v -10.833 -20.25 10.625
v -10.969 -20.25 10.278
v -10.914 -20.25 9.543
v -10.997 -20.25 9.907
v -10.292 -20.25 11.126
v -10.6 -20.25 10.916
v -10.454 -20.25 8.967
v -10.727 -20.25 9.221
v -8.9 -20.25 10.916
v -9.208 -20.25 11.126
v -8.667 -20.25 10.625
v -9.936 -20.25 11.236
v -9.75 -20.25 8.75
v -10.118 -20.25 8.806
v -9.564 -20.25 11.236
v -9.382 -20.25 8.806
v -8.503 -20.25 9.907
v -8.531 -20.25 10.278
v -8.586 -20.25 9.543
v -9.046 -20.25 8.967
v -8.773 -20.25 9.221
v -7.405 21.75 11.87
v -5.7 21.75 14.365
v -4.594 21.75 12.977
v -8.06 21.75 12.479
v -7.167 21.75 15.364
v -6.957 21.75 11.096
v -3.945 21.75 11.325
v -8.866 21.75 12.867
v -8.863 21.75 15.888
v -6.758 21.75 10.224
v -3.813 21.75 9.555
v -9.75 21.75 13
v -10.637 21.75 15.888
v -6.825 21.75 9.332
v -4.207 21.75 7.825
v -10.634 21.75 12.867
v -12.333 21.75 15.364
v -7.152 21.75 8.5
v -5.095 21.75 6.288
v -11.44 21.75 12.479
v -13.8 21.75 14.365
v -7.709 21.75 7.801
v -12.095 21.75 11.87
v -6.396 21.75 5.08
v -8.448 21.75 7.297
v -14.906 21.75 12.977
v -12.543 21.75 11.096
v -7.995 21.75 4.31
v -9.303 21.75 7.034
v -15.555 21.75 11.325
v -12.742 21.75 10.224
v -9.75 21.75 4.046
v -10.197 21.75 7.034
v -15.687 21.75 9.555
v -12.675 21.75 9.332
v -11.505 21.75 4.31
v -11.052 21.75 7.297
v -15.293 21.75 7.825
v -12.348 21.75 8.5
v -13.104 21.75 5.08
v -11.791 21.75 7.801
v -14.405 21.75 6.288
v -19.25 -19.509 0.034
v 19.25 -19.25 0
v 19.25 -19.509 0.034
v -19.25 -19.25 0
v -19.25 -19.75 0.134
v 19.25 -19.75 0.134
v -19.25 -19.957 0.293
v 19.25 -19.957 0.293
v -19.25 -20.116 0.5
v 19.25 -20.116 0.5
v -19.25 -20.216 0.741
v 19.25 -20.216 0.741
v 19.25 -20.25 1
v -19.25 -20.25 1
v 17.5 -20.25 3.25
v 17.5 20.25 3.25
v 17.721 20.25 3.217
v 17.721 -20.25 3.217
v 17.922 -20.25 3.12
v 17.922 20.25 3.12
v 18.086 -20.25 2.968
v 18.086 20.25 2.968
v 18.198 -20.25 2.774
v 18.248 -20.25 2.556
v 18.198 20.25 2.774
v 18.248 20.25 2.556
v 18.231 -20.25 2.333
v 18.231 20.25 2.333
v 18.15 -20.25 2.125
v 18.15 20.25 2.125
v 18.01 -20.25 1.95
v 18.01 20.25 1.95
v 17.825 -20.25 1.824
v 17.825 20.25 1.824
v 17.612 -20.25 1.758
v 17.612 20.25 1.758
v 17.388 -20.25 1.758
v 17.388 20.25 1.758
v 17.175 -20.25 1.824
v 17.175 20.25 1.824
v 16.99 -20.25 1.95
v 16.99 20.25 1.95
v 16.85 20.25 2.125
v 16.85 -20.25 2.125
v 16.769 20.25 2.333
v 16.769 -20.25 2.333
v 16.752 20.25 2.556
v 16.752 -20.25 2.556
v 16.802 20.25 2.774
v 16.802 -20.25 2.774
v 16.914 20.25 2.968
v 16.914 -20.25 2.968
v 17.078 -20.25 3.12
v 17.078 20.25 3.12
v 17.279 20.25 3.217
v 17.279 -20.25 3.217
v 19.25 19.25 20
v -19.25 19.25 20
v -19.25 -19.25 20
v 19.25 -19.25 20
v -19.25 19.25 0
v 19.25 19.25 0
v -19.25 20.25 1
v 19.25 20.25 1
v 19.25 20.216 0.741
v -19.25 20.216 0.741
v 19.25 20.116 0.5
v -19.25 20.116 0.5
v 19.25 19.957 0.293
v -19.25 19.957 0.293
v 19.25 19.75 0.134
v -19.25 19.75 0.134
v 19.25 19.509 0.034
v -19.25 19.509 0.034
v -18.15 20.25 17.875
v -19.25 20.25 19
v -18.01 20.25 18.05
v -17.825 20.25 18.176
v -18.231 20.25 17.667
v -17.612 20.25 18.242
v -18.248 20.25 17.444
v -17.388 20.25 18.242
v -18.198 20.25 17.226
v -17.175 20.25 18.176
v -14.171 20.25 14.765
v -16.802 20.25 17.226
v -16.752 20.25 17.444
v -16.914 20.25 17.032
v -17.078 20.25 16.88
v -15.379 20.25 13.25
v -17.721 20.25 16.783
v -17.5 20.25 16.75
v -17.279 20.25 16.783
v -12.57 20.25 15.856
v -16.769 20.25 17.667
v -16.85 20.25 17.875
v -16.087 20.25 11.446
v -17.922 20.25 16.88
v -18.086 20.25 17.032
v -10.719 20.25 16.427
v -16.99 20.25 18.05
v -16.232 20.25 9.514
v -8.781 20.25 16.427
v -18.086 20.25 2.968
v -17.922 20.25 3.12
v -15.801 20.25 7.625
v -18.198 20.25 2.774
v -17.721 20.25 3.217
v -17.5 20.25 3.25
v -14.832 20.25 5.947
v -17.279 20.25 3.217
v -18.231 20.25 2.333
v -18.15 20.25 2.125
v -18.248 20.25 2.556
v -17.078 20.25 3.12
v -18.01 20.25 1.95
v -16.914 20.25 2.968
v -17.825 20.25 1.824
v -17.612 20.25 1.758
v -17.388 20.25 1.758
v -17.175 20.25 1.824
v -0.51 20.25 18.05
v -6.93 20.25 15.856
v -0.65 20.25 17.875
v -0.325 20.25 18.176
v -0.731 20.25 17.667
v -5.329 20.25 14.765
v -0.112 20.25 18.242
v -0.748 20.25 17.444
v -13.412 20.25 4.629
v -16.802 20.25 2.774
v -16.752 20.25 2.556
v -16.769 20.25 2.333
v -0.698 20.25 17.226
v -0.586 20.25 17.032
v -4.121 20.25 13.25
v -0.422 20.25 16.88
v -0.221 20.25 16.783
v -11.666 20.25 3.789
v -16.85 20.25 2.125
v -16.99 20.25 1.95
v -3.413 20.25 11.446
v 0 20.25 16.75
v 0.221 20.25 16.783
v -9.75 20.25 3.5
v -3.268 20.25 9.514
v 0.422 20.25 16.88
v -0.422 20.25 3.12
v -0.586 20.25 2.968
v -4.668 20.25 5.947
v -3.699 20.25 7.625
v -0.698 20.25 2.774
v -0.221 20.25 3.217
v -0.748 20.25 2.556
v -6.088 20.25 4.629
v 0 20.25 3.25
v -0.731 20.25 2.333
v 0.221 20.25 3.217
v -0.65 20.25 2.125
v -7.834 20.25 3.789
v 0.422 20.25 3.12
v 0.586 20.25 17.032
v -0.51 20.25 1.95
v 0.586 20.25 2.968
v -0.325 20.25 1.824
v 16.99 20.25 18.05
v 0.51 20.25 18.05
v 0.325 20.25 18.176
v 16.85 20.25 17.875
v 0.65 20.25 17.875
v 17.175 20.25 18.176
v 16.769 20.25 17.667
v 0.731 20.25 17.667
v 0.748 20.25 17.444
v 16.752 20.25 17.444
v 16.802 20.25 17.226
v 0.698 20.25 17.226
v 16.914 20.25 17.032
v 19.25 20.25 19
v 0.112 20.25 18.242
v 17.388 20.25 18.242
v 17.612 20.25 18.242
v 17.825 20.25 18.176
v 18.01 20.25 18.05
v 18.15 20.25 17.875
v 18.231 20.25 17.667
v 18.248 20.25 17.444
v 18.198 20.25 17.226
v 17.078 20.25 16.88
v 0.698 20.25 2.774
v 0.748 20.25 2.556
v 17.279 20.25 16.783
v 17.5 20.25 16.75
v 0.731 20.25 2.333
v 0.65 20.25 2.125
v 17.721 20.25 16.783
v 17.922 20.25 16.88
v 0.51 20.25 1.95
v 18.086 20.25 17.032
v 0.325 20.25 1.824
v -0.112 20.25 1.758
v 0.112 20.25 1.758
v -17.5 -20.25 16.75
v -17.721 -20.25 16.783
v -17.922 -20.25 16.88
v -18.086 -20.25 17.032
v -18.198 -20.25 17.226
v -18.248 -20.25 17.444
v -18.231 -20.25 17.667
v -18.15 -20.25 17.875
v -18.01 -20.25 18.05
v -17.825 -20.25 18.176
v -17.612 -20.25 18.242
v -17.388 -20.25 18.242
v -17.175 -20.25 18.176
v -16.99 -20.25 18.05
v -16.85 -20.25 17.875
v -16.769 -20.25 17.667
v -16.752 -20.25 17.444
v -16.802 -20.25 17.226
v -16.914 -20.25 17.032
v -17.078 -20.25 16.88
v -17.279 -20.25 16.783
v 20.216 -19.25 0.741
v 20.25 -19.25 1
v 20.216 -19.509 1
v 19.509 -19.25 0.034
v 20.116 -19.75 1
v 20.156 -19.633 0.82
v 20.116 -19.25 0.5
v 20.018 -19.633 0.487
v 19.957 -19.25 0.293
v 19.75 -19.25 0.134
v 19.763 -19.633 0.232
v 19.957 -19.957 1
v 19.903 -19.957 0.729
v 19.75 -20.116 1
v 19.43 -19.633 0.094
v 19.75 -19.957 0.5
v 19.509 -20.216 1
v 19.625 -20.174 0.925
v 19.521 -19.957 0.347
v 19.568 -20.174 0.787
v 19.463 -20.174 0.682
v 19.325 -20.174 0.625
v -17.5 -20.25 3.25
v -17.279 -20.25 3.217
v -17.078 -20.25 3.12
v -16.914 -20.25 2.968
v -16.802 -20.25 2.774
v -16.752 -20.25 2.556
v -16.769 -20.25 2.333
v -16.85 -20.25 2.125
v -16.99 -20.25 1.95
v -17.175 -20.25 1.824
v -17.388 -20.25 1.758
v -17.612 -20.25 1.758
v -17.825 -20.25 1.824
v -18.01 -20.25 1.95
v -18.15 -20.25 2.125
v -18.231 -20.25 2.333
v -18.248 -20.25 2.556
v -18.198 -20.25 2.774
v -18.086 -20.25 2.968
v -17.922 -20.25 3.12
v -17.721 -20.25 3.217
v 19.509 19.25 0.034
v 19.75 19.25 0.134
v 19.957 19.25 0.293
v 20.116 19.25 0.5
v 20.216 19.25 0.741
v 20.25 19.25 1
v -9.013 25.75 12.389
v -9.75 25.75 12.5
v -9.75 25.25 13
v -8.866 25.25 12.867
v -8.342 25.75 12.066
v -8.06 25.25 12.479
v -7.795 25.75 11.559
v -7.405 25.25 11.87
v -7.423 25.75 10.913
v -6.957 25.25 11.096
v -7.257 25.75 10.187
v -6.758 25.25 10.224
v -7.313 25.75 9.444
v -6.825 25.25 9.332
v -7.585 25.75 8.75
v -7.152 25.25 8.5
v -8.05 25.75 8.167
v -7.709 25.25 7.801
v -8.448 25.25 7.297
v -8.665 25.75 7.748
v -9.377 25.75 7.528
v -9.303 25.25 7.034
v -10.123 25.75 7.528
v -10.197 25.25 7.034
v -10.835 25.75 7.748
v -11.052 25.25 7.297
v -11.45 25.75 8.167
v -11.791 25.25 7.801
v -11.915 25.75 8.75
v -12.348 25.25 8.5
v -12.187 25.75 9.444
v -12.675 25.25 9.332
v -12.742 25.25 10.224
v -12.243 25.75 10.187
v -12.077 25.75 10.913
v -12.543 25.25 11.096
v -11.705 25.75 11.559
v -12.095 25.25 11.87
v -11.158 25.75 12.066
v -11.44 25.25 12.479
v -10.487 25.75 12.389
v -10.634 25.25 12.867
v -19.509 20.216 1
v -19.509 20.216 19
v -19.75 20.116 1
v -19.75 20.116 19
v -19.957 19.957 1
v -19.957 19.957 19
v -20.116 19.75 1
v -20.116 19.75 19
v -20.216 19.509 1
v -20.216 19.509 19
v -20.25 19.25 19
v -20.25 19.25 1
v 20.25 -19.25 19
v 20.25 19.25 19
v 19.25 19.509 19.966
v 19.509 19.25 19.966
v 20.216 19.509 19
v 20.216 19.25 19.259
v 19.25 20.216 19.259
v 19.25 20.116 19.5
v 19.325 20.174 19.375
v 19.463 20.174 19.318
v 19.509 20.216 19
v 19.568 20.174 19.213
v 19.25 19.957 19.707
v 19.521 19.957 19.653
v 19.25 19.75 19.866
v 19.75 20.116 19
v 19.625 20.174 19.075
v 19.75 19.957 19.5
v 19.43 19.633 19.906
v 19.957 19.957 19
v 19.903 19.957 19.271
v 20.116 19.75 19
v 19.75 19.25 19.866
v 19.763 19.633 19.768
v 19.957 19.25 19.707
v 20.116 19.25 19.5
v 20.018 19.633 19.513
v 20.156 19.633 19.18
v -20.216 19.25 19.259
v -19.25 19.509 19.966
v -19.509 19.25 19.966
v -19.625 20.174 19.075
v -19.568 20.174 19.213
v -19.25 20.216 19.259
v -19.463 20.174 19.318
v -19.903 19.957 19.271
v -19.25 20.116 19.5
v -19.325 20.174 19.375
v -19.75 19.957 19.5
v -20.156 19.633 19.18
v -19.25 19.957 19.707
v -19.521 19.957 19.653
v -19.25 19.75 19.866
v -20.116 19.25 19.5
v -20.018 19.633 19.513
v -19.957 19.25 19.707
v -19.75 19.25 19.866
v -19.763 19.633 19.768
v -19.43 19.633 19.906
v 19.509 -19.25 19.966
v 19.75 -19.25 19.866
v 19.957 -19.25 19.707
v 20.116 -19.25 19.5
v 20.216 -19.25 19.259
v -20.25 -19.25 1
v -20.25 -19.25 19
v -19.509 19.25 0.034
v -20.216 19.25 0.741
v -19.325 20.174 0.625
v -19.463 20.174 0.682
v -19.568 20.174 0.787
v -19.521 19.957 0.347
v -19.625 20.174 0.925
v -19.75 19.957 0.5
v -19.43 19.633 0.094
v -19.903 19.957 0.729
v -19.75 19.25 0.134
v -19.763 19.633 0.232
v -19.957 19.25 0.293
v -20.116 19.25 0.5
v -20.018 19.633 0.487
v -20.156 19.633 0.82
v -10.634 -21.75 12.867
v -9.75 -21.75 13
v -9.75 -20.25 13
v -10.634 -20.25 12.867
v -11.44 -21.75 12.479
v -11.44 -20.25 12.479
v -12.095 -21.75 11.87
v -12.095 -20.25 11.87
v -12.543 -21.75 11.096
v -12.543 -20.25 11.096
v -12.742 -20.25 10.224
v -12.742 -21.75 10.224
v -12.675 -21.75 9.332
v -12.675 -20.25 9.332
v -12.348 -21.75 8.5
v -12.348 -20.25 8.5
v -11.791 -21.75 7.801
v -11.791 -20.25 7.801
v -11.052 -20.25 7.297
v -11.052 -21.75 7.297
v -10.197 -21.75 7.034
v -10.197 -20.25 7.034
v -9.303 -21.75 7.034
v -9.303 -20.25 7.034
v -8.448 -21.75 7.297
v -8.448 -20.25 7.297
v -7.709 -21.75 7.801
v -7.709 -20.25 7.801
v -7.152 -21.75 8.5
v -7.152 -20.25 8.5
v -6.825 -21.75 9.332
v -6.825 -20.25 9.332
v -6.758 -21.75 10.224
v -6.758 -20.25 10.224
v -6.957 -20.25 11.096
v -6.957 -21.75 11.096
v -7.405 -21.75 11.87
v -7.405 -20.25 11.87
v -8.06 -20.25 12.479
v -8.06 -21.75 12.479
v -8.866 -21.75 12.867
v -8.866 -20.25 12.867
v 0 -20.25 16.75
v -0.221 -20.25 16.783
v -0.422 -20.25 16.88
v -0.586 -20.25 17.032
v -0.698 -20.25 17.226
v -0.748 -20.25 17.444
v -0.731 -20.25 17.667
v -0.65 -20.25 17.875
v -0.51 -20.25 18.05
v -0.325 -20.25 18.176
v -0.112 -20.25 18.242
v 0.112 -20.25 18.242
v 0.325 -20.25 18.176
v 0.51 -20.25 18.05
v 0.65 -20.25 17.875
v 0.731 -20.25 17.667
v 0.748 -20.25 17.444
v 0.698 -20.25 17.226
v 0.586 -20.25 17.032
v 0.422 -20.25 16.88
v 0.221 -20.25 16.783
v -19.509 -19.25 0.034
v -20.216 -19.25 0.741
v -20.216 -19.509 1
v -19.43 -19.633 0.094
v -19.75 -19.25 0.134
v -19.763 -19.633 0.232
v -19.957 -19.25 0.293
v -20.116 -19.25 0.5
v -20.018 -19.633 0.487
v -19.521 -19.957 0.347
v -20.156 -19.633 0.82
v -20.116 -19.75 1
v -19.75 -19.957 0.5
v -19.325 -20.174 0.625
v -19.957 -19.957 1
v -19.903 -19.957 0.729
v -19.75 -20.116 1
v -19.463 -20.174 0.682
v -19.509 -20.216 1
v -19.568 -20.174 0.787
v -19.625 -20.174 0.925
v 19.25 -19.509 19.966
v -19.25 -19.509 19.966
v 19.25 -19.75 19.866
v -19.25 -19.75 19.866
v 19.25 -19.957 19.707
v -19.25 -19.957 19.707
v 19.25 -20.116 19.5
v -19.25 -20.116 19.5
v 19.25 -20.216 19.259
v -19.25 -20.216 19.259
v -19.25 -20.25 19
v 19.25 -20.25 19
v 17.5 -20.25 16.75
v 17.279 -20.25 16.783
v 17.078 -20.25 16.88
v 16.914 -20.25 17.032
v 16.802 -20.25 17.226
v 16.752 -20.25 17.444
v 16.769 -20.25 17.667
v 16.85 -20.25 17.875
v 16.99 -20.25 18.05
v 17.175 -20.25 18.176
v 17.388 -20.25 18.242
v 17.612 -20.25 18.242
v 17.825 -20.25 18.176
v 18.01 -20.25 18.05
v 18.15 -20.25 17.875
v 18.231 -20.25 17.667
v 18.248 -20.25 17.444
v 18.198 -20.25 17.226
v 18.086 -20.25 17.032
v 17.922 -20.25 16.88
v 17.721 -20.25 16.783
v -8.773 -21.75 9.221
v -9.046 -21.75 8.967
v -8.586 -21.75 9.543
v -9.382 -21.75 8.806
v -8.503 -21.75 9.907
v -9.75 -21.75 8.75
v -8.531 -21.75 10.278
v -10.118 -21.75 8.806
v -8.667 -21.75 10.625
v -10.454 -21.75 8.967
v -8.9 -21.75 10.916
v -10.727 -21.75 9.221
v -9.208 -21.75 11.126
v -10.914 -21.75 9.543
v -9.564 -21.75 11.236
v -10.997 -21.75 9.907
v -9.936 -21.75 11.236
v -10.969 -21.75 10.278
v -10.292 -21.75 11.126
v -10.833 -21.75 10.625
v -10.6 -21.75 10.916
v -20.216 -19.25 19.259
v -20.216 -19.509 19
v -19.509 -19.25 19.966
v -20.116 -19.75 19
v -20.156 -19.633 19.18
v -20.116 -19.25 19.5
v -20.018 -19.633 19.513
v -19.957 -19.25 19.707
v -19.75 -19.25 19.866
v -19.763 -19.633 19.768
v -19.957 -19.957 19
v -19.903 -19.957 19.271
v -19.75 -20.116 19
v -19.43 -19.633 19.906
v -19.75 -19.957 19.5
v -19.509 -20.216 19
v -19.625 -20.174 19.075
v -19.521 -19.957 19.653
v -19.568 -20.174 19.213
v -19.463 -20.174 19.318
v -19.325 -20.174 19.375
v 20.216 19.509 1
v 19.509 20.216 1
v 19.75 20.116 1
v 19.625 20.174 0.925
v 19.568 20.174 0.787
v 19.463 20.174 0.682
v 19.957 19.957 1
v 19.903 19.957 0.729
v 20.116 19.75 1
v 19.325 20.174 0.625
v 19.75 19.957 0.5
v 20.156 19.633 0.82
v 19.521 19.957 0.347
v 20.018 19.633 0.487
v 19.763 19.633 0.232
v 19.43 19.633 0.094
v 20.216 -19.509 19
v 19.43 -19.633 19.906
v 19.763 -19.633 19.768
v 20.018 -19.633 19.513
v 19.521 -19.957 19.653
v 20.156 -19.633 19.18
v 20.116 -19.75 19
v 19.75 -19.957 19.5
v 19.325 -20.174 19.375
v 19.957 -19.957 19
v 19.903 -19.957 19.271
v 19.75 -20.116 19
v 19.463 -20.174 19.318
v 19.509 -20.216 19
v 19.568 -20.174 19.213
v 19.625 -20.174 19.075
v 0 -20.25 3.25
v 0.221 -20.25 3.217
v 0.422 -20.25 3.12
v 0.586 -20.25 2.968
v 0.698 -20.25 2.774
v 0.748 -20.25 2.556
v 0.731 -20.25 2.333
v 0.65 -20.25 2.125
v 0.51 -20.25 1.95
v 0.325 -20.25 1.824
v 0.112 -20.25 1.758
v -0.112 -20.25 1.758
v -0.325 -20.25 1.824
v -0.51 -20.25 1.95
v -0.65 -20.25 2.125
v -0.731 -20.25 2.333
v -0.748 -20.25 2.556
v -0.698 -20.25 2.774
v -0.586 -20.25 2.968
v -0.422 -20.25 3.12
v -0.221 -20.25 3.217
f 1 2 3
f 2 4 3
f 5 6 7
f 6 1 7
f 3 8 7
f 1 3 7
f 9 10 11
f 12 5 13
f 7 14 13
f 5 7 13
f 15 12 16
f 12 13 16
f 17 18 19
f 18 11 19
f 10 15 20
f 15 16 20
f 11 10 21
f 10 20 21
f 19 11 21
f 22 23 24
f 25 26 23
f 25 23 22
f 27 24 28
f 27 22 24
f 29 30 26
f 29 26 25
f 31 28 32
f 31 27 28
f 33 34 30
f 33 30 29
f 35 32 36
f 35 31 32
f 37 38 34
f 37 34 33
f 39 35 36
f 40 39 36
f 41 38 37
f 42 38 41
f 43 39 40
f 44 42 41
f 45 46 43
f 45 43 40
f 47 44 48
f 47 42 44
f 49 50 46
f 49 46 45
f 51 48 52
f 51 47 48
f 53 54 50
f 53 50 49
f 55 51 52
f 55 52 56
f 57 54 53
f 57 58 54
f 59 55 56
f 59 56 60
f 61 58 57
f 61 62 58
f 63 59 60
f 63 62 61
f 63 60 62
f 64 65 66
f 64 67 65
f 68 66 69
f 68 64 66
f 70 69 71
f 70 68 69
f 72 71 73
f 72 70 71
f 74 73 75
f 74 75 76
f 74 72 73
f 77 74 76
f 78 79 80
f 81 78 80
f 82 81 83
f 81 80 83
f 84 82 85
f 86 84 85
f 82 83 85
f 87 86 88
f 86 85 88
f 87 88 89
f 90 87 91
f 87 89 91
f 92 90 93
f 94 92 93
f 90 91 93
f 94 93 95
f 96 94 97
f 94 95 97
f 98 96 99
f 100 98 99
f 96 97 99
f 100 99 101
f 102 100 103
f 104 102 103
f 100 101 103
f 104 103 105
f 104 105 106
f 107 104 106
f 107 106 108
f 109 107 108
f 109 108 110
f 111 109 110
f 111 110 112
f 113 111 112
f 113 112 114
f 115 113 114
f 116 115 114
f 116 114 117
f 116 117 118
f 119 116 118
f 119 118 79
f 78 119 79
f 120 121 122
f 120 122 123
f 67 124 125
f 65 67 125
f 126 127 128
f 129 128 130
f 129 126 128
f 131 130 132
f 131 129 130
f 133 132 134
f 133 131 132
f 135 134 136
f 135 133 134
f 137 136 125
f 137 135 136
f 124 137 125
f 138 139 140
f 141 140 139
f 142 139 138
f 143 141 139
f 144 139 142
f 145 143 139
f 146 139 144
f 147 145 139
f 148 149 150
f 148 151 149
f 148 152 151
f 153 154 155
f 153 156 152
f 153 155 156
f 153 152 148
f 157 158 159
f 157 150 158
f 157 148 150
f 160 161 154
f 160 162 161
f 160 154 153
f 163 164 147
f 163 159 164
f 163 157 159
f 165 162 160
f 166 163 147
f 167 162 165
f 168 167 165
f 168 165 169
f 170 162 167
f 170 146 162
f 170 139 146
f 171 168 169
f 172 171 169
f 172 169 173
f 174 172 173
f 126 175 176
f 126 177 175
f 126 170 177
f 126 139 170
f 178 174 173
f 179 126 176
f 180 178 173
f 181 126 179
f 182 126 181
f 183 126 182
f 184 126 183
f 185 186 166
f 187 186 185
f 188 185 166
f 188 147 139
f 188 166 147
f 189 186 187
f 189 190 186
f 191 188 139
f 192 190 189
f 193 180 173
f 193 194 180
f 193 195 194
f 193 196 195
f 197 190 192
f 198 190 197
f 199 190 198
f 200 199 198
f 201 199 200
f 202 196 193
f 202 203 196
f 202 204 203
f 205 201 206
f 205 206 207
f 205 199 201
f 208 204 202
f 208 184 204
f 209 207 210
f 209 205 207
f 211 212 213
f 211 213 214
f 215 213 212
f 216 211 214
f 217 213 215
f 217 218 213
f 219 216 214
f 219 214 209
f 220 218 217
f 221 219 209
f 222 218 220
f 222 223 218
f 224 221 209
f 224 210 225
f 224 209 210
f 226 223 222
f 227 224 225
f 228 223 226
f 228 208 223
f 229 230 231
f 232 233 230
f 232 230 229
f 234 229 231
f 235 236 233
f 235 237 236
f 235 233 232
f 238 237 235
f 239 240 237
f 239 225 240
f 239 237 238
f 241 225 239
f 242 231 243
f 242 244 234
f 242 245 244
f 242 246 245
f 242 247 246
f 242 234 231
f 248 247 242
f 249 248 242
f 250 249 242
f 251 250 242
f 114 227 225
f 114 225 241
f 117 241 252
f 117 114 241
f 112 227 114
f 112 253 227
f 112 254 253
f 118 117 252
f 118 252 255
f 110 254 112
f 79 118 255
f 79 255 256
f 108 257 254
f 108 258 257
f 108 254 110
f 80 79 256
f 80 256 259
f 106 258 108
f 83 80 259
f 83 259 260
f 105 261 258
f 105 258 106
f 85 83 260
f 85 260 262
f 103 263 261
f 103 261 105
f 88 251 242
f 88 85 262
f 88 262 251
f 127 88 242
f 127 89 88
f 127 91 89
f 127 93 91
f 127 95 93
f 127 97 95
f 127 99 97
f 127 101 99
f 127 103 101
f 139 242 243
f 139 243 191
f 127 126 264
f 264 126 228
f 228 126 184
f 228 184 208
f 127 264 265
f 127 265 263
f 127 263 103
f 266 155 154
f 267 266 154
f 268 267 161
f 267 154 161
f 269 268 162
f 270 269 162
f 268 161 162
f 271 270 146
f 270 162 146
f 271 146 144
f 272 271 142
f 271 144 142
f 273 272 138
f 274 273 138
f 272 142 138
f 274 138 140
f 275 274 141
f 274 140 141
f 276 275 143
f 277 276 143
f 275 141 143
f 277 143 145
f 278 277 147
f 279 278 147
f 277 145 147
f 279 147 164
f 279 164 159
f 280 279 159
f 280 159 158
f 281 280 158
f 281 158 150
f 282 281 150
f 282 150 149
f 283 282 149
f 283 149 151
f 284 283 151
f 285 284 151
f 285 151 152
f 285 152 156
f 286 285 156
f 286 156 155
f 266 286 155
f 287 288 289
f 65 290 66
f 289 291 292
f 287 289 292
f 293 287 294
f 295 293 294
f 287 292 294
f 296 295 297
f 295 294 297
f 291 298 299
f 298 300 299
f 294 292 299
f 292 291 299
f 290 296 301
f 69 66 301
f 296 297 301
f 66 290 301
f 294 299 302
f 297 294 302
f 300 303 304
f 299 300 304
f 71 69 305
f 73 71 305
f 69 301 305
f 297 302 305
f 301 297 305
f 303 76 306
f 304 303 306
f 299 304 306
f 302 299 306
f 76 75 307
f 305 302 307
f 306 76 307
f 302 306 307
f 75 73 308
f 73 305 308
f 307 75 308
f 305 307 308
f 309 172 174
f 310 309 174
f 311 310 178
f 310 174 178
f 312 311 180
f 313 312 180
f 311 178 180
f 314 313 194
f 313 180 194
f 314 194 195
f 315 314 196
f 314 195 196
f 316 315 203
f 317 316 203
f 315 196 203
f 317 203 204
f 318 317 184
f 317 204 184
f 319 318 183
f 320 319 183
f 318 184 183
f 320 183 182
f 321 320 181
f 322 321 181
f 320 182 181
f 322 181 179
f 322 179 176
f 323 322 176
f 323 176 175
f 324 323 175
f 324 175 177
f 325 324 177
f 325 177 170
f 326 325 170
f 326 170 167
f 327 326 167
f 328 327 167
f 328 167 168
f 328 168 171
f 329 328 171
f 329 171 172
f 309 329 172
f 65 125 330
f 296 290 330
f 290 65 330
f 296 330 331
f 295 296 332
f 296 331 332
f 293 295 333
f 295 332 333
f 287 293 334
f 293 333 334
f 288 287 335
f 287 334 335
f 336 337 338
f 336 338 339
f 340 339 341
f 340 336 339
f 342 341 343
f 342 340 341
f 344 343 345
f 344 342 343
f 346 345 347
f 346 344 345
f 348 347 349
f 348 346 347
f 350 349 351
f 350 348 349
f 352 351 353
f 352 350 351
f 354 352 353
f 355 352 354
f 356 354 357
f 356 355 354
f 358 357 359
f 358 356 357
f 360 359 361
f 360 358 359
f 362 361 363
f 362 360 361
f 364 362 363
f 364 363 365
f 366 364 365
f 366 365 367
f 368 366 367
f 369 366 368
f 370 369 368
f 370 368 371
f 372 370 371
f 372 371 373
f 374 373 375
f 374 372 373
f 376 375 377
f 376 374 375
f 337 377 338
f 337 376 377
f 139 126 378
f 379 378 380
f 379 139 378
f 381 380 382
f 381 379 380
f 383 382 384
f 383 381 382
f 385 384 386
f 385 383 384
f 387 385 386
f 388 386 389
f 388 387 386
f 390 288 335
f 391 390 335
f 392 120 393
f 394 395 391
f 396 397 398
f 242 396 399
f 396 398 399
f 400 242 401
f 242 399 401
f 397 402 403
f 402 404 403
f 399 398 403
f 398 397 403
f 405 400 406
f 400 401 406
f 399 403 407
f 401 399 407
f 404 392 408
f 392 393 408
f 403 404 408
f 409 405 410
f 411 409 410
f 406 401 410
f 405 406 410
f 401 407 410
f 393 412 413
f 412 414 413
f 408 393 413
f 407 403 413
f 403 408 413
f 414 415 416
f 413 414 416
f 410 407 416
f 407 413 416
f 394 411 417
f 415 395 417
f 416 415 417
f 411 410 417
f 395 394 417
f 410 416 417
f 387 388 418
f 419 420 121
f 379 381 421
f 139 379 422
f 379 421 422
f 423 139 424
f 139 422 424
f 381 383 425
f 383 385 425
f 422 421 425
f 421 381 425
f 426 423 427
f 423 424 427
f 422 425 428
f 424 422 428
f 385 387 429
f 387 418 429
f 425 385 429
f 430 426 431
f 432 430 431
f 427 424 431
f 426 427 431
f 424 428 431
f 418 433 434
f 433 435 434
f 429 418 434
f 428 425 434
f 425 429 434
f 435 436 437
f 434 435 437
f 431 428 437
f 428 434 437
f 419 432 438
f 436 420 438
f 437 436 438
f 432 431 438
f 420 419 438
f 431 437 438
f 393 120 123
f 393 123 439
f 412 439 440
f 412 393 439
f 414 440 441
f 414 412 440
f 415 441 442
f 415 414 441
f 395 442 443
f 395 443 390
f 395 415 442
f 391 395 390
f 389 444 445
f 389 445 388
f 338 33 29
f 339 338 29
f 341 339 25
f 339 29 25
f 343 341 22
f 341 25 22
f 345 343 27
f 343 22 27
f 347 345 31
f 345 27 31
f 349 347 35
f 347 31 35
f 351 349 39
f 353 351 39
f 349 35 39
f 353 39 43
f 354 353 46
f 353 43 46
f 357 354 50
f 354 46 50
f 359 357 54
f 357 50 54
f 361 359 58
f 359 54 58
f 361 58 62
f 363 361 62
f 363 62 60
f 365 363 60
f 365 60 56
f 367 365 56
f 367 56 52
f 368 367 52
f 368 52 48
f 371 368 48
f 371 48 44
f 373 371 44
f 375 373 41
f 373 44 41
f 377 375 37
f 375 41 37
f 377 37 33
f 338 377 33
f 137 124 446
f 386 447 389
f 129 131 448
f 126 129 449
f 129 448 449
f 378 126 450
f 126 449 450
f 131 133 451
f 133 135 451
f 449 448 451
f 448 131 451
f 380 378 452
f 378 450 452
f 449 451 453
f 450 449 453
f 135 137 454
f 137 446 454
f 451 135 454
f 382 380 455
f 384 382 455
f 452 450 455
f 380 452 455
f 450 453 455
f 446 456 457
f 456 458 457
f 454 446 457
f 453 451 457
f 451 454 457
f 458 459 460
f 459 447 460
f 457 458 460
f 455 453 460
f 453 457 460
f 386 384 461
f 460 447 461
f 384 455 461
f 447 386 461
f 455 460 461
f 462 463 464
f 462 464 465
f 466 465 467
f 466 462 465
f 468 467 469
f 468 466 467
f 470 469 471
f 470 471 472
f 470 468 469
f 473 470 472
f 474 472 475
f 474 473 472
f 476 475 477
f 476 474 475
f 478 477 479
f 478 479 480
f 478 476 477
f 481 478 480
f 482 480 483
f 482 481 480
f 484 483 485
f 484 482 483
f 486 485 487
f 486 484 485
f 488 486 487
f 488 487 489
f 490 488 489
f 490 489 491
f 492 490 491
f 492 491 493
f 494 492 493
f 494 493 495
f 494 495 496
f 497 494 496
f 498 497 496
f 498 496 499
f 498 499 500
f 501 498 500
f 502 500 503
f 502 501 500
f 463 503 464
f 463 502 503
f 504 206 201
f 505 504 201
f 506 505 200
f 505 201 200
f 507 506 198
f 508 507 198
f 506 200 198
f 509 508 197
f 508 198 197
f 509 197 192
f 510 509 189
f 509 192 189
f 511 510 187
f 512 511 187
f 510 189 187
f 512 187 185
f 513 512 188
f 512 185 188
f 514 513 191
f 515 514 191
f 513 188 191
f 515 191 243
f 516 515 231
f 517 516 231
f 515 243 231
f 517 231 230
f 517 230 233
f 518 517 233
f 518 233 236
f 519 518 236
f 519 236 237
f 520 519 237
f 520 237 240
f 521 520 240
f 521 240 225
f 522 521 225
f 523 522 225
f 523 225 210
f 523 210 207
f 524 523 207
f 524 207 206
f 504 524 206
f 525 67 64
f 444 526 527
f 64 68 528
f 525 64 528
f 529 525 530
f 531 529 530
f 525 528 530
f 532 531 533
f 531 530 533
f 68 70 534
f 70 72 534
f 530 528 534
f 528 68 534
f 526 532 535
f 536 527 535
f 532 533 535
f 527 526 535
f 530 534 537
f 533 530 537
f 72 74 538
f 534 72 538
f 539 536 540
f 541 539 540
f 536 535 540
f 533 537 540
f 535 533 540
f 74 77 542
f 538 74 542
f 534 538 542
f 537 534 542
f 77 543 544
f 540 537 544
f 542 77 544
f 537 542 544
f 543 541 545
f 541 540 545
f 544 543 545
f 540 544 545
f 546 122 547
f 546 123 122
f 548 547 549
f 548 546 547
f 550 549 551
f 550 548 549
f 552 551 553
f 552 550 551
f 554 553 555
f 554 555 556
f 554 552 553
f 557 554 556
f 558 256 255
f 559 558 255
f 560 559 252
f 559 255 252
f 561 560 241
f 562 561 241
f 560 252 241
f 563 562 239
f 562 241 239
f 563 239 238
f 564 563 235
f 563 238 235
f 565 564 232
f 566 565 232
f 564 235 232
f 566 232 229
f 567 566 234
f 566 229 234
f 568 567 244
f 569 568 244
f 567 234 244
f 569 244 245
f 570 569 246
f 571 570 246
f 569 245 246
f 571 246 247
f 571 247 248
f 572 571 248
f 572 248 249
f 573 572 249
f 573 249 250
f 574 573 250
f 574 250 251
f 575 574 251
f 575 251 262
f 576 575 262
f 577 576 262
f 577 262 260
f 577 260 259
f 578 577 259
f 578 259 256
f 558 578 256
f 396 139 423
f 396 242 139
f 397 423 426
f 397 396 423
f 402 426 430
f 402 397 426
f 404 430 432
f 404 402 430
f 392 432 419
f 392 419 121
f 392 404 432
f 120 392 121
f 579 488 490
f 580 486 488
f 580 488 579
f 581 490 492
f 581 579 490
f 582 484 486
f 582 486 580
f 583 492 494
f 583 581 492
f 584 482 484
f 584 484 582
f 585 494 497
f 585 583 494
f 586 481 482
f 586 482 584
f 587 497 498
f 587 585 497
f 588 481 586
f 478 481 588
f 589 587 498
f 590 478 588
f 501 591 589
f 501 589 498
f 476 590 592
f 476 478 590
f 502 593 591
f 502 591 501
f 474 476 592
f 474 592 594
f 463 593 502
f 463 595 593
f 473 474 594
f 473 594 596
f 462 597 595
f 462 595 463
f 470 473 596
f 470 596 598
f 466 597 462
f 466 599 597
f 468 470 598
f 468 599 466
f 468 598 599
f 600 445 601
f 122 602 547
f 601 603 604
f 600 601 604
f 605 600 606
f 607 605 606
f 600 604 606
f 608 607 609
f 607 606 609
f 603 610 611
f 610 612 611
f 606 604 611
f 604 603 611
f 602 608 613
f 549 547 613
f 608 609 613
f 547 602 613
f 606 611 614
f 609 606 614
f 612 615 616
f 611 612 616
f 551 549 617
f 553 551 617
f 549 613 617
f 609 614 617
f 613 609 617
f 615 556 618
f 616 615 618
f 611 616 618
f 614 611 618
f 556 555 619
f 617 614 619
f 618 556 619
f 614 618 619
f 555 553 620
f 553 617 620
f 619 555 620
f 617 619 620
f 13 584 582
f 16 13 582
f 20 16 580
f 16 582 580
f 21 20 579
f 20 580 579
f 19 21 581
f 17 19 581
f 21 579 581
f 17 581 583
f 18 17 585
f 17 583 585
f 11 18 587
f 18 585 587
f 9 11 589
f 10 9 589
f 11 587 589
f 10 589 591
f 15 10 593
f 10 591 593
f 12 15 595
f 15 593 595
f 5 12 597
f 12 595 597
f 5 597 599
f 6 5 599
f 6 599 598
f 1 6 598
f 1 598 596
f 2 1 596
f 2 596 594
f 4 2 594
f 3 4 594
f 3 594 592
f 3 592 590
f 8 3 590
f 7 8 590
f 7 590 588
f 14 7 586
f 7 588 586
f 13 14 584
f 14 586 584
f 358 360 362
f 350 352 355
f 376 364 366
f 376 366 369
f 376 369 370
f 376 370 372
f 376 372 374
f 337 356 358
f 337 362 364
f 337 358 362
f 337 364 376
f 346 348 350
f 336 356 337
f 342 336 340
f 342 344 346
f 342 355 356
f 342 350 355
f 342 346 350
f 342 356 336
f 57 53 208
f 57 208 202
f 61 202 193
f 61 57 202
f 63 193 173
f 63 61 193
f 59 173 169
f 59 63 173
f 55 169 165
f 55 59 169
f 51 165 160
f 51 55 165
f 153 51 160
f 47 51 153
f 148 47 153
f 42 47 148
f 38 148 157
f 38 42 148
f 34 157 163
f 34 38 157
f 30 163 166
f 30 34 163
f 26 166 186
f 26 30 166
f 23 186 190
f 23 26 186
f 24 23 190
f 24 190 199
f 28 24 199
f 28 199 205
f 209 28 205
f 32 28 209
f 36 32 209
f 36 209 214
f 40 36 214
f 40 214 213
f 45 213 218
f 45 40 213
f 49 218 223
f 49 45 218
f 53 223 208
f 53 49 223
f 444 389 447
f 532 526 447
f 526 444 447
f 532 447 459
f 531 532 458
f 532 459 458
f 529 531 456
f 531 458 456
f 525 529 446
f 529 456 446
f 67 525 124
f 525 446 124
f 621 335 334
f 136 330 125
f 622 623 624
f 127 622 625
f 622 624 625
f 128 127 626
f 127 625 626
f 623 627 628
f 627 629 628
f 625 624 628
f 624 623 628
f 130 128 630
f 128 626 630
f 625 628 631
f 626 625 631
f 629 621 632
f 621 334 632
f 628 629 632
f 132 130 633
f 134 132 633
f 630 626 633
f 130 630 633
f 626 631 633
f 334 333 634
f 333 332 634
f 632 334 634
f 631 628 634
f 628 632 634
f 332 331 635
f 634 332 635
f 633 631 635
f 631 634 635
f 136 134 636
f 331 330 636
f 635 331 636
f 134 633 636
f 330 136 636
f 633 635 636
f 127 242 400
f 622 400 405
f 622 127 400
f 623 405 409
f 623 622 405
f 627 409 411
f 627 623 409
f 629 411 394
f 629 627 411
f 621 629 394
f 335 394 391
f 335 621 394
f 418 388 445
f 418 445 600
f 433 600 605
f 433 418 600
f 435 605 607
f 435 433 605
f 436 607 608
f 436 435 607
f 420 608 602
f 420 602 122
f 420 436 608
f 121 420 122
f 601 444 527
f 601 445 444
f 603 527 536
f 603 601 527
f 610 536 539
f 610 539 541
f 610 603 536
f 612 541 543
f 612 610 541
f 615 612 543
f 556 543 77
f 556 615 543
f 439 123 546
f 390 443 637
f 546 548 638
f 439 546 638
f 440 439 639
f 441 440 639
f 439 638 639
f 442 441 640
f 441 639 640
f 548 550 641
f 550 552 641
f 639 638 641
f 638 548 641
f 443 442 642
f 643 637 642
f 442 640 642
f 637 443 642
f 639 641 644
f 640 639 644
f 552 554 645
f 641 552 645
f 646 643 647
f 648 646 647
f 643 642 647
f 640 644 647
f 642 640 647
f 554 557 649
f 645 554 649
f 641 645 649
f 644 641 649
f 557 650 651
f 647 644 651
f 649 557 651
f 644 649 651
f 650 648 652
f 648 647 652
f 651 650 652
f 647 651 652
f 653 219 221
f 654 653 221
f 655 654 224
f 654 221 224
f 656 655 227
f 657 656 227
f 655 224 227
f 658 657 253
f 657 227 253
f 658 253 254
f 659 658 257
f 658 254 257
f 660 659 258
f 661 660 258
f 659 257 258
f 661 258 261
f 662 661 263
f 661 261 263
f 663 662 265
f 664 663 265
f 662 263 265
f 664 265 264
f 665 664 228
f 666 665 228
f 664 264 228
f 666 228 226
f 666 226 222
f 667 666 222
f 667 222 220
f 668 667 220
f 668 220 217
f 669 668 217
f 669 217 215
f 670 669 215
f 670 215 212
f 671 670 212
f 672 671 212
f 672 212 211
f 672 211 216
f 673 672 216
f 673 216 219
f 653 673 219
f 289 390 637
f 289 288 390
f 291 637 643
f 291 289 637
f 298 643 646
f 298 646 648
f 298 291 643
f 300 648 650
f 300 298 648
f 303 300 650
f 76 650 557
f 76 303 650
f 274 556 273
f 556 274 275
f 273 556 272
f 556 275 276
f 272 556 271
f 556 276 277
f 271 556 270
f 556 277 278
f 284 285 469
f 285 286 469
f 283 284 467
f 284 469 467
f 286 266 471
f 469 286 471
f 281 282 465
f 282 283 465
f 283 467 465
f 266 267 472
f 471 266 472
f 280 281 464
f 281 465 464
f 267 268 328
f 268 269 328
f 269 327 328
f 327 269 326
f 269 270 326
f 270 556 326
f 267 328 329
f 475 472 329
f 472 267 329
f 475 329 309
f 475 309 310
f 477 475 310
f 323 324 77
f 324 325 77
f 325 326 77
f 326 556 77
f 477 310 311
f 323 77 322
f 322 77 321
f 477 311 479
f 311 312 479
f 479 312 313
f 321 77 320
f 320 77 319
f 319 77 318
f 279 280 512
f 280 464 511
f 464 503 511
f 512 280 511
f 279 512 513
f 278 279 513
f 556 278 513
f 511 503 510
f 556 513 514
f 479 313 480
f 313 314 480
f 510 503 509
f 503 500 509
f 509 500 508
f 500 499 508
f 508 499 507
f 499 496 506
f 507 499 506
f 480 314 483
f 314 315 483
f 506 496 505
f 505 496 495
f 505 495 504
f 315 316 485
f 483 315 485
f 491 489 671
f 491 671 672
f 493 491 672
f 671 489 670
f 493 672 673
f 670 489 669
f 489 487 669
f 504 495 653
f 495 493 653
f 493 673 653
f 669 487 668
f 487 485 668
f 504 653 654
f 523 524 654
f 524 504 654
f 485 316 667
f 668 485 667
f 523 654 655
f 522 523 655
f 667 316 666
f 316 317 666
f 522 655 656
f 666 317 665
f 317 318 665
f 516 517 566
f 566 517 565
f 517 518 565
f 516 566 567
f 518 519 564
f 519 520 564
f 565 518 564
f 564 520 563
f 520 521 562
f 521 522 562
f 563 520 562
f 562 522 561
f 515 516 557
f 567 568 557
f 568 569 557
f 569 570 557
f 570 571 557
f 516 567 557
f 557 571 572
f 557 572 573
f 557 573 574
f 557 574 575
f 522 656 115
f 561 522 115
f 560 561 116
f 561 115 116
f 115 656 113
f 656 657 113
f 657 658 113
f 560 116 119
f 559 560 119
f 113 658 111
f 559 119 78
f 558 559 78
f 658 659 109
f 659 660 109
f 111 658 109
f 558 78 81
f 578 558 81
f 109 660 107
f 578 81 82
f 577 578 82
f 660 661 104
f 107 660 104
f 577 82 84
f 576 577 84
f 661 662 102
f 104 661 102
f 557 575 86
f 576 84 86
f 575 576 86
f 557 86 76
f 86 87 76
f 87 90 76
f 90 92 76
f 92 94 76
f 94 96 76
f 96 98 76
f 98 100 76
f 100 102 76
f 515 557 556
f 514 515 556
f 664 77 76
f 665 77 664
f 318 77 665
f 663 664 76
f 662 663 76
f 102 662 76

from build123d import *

# Parameters (mm, degrees)
SKETCH_1_W          = 40.5
SKETCH_1_H          = 40.5
EXTRUDE_1_DEPTH     = 20
SKETCH_2_R          = 6.5
EXTRUDE_2_DEPTH     = 1.5
SKETCH_5_R          = 0.75
CUT_EXTRUDE_1_DEPTH = 50.500631309
SKETCH_12_R         = 3
EXTRUDE_3_DEPTH     = 4
CHAMFER_1_SIZE2     = 0.545955351
CHAMFER_1_SIZE      = 1.5
CHAMFER_2_SIZE      = 0.5
EXTRUDE_START       = 1.5
SKETCH_18_R         = 3
SKETCH_18_R_2       = 1.25
EXTRUDE_4_DEPTH     = 1.5
FILLET_2_R          = 1
FILLET_3_R          = 1


with BuildPart() as part:
    # 草圖1 → 伸長1 (new body)
    with BuildSketch(Plane.XY):
        Rectangle(SKETCH_1_W, SKETCH_1_H)
    extrude(amount=EXTRUDE_1_DEPTH)

    # 草圖2 → 伸長2 (add)
    with BuildSketch(Plane(origin=(0, 20.25, 0), x_dir=(1, 0, 0), z_dir=(0, 1, 0))):
        with Locations(Location((-9.75, -10, 0), (0, 0, 90))):
            Circle(SKETCH_2_R)
    extrude(amount=EXTRUDE_2_DEPTH)

    # 草圖5 → 除料-伸長1 (cut, through all)
    with BuildSketch(Plane(origin=(0, 20.25, 0), x_dir=(1, 0, 0), z_dir=(0, 1, 0))):
        with Locations(Location((-17.5, -2.5, 0), (0, 0, 270))):
            Circle(SKETCH_5_R)
        with Locations(Location((0, -2.5, 0), (0, 0, 270))):
            Circle(SKETCH_5_R)
        with Locations(Location((17.5, -2.5, 0), (0, 0, 270))):
            Circle(SKETCH_5_R)
        with Locations(Location((17.5, -17.5, 0), (0, 0, 90))):
            Circle(SKETCH_5_R)
        with Locations(Location((0, -17.5, 0), (0, 0, 90))):
            Circle(SKETCH_5_R)
        with Locations(Location((-17.5, -17.5, 0), (0, 0, 90))):
            Circle(SKETCH_5_R)
    extrude(amount=-CUT_EXTRUDE_1_DEPTH, mode=Mode.SUBTRACT)

    # 草圖12 → 伸長3 (add)
    with BuildSketch(Plane(origin=(0, 21.75, 0), x_dir=(1, 0, 0), z_dir=(0, 1, 0))):
        with Locations(Location((-9.75, -10, 0), (0, 0, 270))):
            Circle(SKETCH_12_R)
    extrude(amount=EXTRUDE_3_DEPTH)

    # 導角1
    chamfer_1_edges = [part.edges().sort_by_distance(p)[0] for p in [
        (-9.75, 21.75, 16.5),
    ]]
    chamfer_1_side = [part.faces().sort_by_distance(p)[0] for p in [
        (-9.75, 21.739080893, 16.5),
    ]]
    chamfer(chamfer_1_edges, length=CHAMFER_1_SIZE - 0.0001, length2=CHAMFER_1_SIZE2 - 0.0001, reference=chamfer_1_side[0])  # a hair under: the kernel refuses the full size

    # 導角2
    chamfer_2_edges = [part.edges().sort_by_distance(p)[0] for p in [
        (-9.75, 25.75, 7),
    ]]
    chamfer(chamfer_2_edges, length=CHAMFER_2_SIZE)

    # 草圖18 → 伸長4 (add)
    with BuildSketch(Plane.XZ.offset(20.25).offset(EXTRUDE_START)):
        with Locations(Location((-9.75, 10, 0), (0, 0, 90))):
            Circle(SKETCH_18_R)
        with Locations(Location((-9.75, 10, 0), (0, 0, 270))):
            Circle(SKETCH_18_R_2, mode=Mode.SUBTRACT)
    extrude(amount=-EXTRUDE_4_DEPTH)

    # 圓角2
    fillet_2_edges = [part.edges().sort_by_distance(p)[0] for p in [
        (20.25, 0, 20),
        (-20.25, 0, 20),
        (20.25, 0, 0),
        (-20.25, 0, 0),
    ]]
    fillet(fillet_2_edges, radius=FILLET_2_R)

    # 圓角3
    fillet_3_edges = [part.edges().sort_by_distance(p)[0] for p in [
        (0, -20.25, 20),
        (0, 20.25, 20),
        (0, 20.25, 0),
        (-20.25, 20.25, 10),
        (20.25, 20.25, 10),
        (-19.957106781, 20.25, 19.707106781),
        (-19.957106781, 20.25, 0.292893219),
        (19.957106781, 20.25, 0.292893219),
        (19.957106781, 20.25, 19.707106781),
        (20.25, -20.25, 10),
        (0, -20.25, 0),
        (-20.25, -20.25, 10),
        (-19.957106781, -20.25, 19.707106781),
        (-19.957106781, -20.25, 0.292893219),
        (19.957106781, -20.25, 0.292893219),
        (19.957106781, -20.25, 19.707106781),
    ]]
    fillet(fillet_3_edges, radius=FILLET_3_R)


solid = part.part
